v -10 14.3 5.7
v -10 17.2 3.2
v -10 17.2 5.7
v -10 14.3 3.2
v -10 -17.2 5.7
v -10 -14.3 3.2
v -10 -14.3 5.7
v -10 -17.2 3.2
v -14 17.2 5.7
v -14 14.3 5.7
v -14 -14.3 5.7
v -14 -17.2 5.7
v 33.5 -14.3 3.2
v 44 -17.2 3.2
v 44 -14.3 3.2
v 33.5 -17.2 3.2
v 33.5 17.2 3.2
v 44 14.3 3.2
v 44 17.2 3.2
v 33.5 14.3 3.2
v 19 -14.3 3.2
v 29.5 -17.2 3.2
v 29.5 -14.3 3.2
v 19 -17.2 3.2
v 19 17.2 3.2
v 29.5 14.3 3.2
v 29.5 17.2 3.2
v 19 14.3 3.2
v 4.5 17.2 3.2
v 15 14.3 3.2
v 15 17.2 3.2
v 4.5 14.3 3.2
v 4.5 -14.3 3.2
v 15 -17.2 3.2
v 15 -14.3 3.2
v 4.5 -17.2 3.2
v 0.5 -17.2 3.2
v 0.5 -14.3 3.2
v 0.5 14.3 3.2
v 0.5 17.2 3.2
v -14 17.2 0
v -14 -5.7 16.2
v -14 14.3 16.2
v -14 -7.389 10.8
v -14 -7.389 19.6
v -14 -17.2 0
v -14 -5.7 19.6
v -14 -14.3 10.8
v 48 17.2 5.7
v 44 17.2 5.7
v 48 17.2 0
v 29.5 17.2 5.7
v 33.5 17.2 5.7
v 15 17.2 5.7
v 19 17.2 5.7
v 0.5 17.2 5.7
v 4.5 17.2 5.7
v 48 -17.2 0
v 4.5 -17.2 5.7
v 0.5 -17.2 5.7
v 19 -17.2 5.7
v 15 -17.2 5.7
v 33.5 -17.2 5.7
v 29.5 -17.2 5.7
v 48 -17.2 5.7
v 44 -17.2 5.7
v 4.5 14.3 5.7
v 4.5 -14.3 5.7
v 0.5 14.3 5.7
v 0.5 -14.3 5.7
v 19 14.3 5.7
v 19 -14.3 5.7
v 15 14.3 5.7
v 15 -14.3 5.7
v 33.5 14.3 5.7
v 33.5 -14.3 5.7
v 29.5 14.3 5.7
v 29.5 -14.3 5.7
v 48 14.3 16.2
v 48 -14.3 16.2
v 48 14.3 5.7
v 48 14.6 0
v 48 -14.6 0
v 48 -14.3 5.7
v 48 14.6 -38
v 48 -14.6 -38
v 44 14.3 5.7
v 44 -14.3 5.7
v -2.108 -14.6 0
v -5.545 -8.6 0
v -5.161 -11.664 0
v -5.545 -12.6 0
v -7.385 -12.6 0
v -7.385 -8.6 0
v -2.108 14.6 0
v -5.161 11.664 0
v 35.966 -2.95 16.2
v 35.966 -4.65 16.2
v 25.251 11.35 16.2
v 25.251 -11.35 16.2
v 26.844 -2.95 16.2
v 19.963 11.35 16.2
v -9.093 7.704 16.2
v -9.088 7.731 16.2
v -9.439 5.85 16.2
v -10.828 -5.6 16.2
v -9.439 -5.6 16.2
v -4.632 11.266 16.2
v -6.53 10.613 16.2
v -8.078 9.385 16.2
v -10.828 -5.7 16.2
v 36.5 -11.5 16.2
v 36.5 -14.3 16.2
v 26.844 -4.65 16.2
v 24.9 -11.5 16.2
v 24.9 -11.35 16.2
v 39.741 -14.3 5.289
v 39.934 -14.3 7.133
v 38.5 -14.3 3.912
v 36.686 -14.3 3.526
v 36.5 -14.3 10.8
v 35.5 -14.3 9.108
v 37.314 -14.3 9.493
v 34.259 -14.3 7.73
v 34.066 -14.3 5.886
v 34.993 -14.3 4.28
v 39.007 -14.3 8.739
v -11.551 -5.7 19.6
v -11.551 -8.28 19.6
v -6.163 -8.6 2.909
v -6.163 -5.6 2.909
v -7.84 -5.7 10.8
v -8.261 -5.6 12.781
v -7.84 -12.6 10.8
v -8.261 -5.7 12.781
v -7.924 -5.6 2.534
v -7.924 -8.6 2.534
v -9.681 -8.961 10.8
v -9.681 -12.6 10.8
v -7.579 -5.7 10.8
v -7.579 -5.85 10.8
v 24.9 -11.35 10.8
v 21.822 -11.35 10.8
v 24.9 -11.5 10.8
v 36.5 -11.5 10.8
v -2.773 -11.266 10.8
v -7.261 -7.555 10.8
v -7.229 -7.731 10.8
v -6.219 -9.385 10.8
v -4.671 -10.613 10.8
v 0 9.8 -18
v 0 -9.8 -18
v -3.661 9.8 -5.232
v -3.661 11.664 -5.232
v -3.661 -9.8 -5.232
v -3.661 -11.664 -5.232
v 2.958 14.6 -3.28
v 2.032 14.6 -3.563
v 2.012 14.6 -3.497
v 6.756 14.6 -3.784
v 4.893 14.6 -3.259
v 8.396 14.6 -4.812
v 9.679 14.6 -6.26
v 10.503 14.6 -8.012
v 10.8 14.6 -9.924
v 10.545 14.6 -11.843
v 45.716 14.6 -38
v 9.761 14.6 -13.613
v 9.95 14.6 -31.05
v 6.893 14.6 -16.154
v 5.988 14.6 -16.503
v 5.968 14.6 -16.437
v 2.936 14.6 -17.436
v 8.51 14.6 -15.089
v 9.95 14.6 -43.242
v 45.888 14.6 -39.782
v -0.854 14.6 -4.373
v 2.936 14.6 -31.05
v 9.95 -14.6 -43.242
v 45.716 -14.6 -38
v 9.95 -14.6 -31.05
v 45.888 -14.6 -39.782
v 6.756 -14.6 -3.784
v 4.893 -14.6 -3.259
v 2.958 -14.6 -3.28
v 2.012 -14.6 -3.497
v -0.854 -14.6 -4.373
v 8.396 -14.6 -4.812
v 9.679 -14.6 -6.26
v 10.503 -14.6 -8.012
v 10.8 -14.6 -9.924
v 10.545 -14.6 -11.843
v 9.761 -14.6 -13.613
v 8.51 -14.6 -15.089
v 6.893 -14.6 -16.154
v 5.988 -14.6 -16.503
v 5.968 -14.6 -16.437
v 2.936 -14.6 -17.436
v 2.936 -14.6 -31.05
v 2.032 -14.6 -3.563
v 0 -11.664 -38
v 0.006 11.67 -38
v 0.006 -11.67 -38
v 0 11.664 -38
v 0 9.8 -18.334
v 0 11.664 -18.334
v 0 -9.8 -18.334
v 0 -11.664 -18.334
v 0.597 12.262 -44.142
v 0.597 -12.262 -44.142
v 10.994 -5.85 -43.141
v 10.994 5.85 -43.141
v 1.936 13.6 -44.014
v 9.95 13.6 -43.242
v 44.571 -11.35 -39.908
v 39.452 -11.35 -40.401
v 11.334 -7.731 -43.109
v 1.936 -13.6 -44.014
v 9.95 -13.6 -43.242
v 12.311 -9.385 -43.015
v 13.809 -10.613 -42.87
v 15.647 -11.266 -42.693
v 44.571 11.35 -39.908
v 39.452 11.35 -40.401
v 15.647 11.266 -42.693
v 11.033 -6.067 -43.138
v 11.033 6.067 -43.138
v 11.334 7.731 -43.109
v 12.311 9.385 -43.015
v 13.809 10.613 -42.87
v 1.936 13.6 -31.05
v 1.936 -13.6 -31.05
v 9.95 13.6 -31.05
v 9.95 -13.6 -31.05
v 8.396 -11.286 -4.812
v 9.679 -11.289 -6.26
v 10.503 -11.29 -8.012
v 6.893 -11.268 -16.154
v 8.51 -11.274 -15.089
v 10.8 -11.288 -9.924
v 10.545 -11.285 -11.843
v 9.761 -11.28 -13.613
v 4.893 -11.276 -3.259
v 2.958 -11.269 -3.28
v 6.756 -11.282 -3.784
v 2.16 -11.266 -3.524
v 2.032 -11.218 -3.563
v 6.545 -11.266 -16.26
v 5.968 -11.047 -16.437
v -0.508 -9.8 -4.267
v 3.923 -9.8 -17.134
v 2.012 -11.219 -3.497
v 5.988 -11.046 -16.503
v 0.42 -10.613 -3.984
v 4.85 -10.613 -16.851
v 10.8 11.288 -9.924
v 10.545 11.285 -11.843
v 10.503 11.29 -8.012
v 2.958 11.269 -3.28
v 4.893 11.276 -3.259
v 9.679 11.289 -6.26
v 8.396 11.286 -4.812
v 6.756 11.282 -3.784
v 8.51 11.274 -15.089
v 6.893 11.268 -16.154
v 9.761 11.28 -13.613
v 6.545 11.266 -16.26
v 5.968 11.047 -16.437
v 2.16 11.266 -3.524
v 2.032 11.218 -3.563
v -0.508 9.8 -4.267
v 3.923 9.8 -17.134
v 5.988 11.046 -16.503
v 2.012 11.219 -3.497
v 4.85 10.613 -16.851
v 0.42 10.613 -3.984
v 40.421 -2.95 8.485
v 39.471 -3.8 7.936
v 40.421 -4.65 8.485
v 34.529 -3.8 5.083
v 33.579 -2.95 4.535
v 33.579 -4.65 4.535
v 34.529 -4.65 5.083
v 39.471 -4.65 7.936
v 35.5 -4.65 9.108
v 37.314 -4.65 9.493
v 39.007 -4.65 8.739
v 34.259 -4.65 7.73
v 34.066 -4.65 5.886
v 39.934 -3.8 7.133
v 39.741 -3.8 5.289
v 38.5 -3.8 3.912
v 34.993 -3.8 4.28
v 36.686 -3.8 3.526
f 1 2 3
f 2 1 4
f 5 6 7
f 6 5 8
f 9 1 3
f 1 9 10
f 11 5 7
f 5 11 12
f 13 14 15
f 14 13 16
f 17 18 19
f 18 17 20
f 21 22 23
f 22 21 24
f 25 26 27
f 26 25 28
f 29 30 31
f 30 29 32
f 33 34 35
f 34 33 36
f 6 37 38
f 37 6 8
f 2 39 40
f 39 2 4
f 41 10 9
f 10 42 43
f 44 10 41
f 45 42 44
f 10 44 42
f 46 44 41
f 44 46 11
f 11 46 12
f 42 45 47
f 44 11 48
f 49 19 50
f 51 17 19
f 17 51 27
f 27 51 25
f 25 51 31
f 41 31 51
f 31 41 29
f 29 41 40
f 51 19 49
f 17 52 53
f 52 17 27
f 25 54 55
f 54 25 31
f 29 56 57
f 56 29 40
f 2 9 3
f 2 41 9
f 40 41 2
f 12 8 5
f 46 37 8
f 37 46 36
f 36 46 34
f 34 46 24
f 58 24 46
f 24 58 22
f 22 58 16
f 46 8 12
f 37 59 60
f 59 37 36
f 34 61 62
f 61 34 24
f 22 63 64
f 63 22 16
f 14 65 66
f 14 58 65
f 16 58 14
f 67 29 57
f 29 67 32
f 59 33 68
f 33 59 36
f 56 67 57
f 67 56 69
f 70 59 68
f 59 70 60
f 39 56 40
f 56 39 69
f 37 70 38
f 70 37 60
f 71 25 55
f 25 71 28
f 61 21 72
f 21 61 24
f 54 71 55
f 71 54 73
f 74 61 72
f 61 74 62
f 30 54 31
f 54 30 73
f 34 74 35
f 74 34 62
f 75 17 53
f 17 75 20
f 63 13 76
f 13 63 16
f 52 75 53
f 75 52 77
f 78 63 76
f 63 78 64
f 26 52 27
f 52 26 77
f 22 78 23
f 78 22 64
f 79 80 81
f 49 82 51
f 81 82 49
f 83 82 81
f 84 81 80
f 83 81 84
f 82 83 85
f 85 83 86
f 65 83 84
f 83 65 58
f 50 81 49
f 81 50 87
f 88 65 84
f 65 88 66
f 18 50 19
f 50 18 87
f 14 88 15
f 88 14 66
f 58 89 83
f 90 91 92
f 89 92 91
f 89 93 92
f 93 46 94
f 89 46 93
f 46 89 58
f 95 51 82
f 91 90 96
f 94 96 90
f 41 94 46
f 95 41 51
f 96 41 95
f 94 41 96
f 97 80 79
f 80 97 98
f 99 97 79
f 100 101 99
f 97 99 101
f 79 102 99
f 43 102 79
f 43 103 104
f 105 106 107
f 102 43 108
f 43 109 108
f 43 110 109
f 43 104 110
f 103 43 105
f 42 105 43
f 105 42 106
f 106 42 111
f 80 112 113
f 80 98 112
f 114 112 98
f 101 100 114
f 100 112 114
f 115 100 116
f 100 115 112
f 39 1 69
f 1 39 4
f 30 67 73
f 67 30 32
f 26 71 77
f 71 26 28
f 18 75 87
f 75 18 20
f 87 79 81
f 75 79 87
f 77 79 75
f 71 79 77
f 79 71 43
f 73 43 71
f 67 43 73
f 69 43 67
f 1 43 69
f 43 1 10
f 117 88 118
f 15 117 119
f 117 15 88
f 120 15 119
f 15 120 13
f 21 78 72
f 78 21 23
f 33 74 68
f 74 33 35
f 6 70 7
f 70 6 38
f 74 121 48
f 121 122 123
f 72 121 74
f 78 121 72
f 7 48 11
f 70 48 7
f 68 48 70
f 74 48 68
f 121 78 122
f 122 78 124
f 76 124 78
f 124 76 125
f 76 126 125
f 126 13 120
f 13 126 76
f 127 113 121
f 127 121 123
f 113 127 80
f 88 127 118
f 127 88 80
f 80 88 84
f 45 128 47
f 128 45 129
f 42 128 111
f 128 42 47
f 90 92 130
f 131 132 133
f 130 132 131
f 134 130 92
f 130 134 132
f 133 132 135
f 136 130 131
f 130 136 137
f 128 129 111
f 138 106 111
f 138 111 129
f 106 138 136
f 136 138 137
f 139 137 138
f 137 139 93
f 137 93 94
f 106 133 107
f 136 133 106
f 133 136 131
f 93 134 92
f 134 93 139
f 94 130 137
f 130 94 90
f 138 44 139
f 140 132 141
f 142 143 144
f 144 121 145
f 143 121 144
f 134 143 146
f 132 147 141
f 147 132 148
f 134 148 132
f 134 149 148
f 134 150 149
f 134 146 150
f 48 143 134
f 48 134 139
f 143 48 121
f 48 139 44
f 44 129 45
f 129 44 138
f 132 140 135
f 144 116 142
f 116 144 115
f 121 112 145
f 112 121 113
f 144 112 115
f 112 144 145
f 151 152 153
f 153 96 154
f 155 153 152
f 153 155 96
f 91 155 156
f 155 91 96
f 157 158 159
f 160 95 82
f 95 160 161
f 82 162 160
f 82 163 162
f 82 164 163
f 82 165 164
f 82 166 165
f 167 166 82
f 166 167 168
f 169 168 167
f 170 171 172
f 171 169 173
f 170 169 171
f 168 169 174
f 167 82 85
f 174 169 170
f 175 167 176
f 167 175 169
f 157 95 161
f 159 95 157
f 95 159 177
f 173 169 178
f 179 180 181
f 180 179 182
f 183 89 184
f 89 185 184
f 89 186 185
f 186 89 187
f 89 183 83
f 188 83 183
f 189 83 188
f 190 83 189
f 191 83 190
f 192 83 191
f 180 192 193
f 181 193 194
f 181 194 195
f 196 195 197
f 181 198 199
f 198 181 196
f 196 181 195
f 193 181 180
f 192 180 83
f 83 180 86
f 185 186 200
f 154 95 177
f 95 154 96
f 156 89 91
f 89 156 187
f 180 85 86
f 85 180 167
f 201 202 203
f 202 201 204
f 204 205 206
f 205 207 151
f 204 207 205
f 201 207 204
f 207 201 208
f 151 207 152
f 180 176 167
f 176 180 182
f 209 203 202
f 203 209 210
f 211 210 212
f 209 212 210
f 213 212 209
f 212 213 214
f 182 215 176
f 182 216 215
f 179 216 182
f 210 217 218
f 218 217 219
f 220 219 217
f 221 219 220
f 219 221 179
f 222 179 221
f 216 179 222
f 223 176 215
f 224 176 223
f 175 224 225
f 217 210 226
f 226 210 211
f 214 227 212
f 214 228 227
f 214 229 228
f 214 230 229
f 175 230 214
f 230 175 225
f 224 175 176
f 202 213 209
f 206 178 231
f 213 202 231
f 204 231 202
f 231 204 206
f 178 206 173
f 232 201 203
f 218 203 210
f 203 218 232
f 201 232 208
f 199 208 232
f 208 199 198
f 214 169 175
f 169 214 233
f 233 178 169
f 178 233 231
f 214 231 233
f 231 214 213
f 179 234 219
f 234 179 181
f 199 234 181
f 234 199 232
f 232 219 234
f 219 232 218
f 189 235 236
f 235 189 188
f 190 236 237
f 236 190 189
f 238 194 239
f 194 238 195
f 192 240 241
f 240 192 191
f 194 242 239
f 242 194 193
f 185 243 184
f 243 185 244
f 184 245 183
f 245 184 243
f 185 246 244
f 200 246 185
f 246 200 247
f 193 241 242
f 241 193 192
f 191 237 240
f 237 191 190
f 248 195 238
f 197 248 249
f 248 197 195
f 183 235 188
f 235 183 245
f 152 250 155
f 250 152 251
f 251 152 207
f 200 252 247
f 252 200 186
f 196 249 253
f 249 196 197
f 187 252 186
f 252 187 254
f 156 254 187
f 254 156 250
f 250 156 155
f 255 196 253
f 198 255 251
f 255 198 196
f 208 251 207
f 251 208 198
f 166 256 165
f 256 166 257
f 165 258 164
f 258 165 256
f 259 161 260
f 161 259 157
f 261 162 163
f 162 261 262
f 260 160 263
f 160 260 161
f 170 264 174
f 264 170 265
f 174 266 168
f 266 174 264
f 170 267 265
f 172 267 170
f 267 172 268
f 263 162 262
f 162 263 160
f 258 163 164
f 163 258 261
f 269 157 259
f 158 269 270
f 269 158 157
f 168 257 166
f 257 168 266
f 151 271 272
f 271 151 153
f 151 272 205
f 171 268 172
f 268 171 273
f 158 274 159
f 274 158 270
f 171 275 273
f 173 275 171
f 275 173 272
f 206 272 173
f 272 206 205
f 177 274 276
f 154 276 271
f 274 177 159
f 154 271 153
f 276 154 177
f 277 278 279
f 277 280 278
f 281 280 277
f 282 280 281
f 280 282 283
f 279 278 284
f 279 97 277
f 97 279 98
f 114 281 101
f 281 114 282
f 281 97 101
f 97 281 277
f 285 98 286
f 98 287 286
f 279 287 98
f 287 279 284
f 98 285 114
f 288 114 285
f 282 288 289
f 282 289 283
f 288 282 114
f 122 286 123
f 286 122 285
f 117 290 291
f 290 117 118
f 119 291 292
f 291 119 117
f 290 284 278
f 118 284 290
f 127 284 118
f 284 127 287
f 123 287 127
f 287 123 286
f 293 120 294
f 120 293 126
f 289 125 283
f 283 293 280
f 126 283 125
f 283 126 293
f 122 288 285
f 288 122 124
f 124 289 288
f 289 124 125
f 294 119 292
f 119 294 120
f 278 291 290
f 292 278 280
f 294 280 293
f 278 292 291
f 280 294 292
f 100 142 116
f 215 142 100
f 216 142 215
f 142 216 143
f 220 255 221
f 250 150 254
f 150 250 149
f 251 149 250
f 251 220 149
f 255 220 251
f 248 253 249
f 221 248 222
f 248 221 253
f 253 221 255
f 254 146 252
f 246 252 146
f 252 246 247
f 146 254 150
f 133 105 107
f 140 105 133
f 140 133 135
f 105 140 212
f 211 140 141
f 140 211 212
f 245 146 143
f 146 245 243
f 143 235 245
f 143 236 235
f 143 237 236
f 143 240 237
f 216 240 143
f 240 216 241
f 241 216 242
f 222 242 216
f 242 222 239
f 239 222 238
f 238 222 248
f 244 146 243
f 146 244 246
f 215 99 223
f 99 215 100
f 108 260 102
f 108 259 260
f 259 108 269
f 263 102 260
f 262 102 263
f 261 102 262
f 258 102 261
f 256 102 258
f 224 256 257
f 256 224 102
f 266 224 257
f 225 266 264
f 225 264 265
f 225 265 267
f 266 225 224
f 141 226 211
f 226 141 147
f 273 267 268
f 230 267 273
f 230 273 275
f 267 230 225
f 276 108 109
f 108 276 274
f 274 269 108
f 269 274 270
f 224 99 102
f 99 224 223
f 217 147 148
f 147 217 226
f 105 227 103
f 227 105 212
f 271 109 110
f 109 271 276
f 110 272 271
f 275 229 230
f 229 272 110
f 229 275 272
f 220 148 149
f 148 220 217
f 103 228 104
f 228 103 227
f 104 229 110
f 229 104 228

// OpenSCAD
// file: ru9_adapter.scad
//
// The core module for Ruger PC Carbine adapters
//

// LOM C0: the lower cube zero
lom_c0_len = 48.0;
lom_c0_w = 29.2;
lom_c0_h = 38.0;

// Top C1: the top base cube 1, under "ribs"
top_c1_len = 62.0;
top_c1_w = 34.4;
top_c1_h = 3.2;
// "Rib"
top_c1r_len = 4.0;
top_c1r_w = top_c1_w;
top_c1r_h = 5.7-top_c1_h;
// Top C2: the center box
top_c2_len = top_c1_len;
top_c2_w = 28.6;
top_c2_h = 16.2;

// The top part of the adapter, above the zero plane
module top() {
    translate([lom_c0_len - top_c1_len, 0, 0]) {
        difference () {
            union () {
                // Main plate
                translate([0, (top_c1_w/2)*-1, 0])
                    cube([top_c1_len, top_c1_w, top_c1_h]);
                // "Ribs"
                effective_length = top_c1_len - top_c1r_len;
                for (pitch_base = [0 : effective_length/4 : top_c1_len]) {
                    translate([pitch_base, (top_c1r_w/2)*-1, top_c1_h])
                        cube([top_c1r_len, top_c1r_w, top_c1r_h]);
                }
                // Center box
                translate([0, (top_c2_w/2)*-1, 0])
                    cube([top_c2_len, top_c2_w, top_c2_h]);
                // Rest for the bolt stop transfer bar
                translate([0, -8.7, top_c2_h-0.1])
                    cube([3.2, 3.0, 3.5]);
            }

            // Cut for the bolt stop lever, accounts for its S-shape
            // This also truncates the rest for the bolt stop transfer bar.
            translate([-2.5, (top_c2_w/2 - 2.5)*-1, 10.8])
                rotate(-20.0, [0,0,1])
                    cube([20.0, 5.0, 9.0]);
            translate([4.4, (top_c2_w/2 + 0.2)*-1, 10.8])
                cube([6.0, 8.6 + 0.2, 5.5]);
            translate([-0.1, (top_c2_w/2 + 0.2)*-1, 10.8])
                cube([39.0, 5.0, 5.5]);
            translate([23.5, (top_c2_w/2 + 0.2)*-1, 10.8])
                cube([27.0, 3.0, 5.5]);

            // Cut for bolt stop transfer bar
            translate([6.7, -12.6, -0.4]) {
                rotate(-12.0, [0,1,0])
                    union () {
                        translate([0, 0, 3.0])
                            cube([1.8, 7.0, 18.0]);
                        cube([1.8, 4.0, 18.0]);
                    }
            }
        }
    }
}

// Lower Outer Mold, below the zero plane
module lom() {

    difference () {
        union () {

            translate([0, 0, lom_c0_h*-1]) {
                // The main body is a straight cube.
                translate([0, (lom_c0_w/2)*-1, 0])
                    cube([lom_c0_len, lom_c0_w, lom_c0_h + 0.1]);
            }

            // A litte slope in front, magazine intrudes into it.
            translate([0, 0, -18.0]) {
                rotate(-16.0, [0,1,0]) {
                    lom_slope_h = 19.1;
                    difference () {
                        translate([0, (lom_c0_w/2)*-1, 0])
                            cube([6.6, lom_c0_w, lom_slope_h]);
                        // Massive bevel is necessary.
                        translate([-0.1, (lom_c0_w/2 + 0.5), lom_slope_h/2])
                            rotate(-45.0, [0,0,1])
                                cube([5.0, 5.0, lom_slope_h + 0.2], center=true);
                        translate([-0.1, (lom_c0_w/2 + 0.5)*-1, lom_slope_h/2])
                            rotate(45.0, [0,0,1])
                                cube([5.0, 5.0, lom_slope_h + 0.2], center=true);
                    }
                }
            } // translate

            // Bottom slope
            translate([0, 0, (lom_c0_h + 6.2)*-1])
                rotate(-5.5, [0,1,0])
                    translate([0.6, ((lom_c0_w)/2)*-1, 0])
                        cube([lom_c0_len - 2.5, lom_c0_w, 6.2]);
        }

        translate([0, 0, (lom_c0_h + 6.0)*-1]) {
            union () {

                // Massive bevel is necessary.
                translate([-0.1, (lom_c0_w/2 + 0.5), (lom_c0_h - 7.0)/2 - 0.1])
                    rotate(-45.0, [0,0,1])
                        cube([5.0, 5.0, lom_c0_h - 7.0 + 0.1], center=true);
                translate([-0.1, (lom_c0_w/2 + 0.5)*-1, (lom_c0_h - 7.0)/2 - 0.1])
                    rotate(45.0, [0,0,1])
                        cube([5.0, 5.0, lom_c0_h - 7.0 + 0.1], center=true);

                // Little side indentations are necessary too.
                translate([10.0/2-0.1, (lom_c0_w/2), 10.0/2-0.1])
                    cube([10.0 + 0.1, 2.0, 16.0 + 0.1], center=true);
                translate([10.0/2-0.1, (lom_c0_w/2)*-1, 10.0/2-0.1])
                    cube([10.0 + 0.1, 2.0, 16.0 + 0.1], center=true);
            }
        }

        // Cutouts for the factory latch
        lom_latch_r = 6.8;
        translate([4.0, (lom_c0_w/2 - 4.8)*-1, -10.0]) {
            rotate(-17.0, [0,1,0])
                rotate(90.0, [1,0,0])
                    union () {
                        cylinder(4.8 + 0.1, lom_latch_r, lom_latch_r);
                        translate([-7.0, -lom_latch_r, 0])
                            cube([7.0, lom_latch_r*2, 4.8 + 0.1]);
                    }
        }
        translate([4.0, (lom_c0_w/2 - 4.8), -10.0]) {
            rotate(-17.0, [0,1,0])
               rotate(-90.0, [1,0,0])
                    union () {
                        cylinder(4.8 + 0.1, lom_latch_r, lom_latch_r);
                        translate([-7.0, -lom_latch_r, 0])
                            cube([7.0, lom_latch_r*2, 4.8 + 0.1]);
                    }
        }
    }
}
// main file
//
// RU9M17
// Ruger PC Carbine, adapter for SIG P320/M17
//

use <ru9_adapter.scad>;

// The magazine cavity on Ruger does not include the top, narrowing part.
// So, we use a simple straight hole, a rotate, and no multmatrix.
module mag_p320 () {
    m_len = 32.8;
    m_w = 22.7;
    m_fr_r = 5.5;
    m_h = 72;  // slanted length, just great enough to pierce the whole design

    hull () {
        translate([m_fr_r, (m_w/2 - m_fr_r), 0])
            cylinder(m_h, m_fr_r, m_fr_r);
        translate([m_fr_r, (m_w/2 - m_fr_r)*-1, 0])
            cylinder(m_h, m_fr_r, m_fr_r);
        translate([m_len - 5.0, (m_w/2)*-1, 0])
            cube([5.0, m_w, m_h]);
    }
}

// The root of the ejector is 1.38 thick, 7.5 wide.
module ejector_cavity () {

    depth = 30.0;  // excessive on purpose - should be called "cut_length"?

    union () {

        translate([29.5, -3.8, 19.5]) {

            rotate(60.0, [0, 1, 0]) {

                // The main pocket is a pocket at 60 degrees, documented
                // in ar9mm_02_ejector.xcf. We center the cube so that it
                // rotates in a predictable way.
                translate([(depth/2)*-1, (1.7/2)*-1, (7.9/2)*-1])
                    cube([depth, 1.7, 7.9]);

                // We also add an inspection hole.
                translate([depth/2, 0, 0])
                    rotate(90, [1, 0, 0])
                        cylinder(20, 3, 3);
            }
        }

    }
}

module adapter () {
    difference () {
        union () {
            top();
            lom();
            // latch();
        }
        translate([13.7, 0, -51.0])
            rotate(-19.0, [0,1,0])
                mag_p320();
        ejector_cavity();
    }
}

module main () {
    adapter();
}

main();
